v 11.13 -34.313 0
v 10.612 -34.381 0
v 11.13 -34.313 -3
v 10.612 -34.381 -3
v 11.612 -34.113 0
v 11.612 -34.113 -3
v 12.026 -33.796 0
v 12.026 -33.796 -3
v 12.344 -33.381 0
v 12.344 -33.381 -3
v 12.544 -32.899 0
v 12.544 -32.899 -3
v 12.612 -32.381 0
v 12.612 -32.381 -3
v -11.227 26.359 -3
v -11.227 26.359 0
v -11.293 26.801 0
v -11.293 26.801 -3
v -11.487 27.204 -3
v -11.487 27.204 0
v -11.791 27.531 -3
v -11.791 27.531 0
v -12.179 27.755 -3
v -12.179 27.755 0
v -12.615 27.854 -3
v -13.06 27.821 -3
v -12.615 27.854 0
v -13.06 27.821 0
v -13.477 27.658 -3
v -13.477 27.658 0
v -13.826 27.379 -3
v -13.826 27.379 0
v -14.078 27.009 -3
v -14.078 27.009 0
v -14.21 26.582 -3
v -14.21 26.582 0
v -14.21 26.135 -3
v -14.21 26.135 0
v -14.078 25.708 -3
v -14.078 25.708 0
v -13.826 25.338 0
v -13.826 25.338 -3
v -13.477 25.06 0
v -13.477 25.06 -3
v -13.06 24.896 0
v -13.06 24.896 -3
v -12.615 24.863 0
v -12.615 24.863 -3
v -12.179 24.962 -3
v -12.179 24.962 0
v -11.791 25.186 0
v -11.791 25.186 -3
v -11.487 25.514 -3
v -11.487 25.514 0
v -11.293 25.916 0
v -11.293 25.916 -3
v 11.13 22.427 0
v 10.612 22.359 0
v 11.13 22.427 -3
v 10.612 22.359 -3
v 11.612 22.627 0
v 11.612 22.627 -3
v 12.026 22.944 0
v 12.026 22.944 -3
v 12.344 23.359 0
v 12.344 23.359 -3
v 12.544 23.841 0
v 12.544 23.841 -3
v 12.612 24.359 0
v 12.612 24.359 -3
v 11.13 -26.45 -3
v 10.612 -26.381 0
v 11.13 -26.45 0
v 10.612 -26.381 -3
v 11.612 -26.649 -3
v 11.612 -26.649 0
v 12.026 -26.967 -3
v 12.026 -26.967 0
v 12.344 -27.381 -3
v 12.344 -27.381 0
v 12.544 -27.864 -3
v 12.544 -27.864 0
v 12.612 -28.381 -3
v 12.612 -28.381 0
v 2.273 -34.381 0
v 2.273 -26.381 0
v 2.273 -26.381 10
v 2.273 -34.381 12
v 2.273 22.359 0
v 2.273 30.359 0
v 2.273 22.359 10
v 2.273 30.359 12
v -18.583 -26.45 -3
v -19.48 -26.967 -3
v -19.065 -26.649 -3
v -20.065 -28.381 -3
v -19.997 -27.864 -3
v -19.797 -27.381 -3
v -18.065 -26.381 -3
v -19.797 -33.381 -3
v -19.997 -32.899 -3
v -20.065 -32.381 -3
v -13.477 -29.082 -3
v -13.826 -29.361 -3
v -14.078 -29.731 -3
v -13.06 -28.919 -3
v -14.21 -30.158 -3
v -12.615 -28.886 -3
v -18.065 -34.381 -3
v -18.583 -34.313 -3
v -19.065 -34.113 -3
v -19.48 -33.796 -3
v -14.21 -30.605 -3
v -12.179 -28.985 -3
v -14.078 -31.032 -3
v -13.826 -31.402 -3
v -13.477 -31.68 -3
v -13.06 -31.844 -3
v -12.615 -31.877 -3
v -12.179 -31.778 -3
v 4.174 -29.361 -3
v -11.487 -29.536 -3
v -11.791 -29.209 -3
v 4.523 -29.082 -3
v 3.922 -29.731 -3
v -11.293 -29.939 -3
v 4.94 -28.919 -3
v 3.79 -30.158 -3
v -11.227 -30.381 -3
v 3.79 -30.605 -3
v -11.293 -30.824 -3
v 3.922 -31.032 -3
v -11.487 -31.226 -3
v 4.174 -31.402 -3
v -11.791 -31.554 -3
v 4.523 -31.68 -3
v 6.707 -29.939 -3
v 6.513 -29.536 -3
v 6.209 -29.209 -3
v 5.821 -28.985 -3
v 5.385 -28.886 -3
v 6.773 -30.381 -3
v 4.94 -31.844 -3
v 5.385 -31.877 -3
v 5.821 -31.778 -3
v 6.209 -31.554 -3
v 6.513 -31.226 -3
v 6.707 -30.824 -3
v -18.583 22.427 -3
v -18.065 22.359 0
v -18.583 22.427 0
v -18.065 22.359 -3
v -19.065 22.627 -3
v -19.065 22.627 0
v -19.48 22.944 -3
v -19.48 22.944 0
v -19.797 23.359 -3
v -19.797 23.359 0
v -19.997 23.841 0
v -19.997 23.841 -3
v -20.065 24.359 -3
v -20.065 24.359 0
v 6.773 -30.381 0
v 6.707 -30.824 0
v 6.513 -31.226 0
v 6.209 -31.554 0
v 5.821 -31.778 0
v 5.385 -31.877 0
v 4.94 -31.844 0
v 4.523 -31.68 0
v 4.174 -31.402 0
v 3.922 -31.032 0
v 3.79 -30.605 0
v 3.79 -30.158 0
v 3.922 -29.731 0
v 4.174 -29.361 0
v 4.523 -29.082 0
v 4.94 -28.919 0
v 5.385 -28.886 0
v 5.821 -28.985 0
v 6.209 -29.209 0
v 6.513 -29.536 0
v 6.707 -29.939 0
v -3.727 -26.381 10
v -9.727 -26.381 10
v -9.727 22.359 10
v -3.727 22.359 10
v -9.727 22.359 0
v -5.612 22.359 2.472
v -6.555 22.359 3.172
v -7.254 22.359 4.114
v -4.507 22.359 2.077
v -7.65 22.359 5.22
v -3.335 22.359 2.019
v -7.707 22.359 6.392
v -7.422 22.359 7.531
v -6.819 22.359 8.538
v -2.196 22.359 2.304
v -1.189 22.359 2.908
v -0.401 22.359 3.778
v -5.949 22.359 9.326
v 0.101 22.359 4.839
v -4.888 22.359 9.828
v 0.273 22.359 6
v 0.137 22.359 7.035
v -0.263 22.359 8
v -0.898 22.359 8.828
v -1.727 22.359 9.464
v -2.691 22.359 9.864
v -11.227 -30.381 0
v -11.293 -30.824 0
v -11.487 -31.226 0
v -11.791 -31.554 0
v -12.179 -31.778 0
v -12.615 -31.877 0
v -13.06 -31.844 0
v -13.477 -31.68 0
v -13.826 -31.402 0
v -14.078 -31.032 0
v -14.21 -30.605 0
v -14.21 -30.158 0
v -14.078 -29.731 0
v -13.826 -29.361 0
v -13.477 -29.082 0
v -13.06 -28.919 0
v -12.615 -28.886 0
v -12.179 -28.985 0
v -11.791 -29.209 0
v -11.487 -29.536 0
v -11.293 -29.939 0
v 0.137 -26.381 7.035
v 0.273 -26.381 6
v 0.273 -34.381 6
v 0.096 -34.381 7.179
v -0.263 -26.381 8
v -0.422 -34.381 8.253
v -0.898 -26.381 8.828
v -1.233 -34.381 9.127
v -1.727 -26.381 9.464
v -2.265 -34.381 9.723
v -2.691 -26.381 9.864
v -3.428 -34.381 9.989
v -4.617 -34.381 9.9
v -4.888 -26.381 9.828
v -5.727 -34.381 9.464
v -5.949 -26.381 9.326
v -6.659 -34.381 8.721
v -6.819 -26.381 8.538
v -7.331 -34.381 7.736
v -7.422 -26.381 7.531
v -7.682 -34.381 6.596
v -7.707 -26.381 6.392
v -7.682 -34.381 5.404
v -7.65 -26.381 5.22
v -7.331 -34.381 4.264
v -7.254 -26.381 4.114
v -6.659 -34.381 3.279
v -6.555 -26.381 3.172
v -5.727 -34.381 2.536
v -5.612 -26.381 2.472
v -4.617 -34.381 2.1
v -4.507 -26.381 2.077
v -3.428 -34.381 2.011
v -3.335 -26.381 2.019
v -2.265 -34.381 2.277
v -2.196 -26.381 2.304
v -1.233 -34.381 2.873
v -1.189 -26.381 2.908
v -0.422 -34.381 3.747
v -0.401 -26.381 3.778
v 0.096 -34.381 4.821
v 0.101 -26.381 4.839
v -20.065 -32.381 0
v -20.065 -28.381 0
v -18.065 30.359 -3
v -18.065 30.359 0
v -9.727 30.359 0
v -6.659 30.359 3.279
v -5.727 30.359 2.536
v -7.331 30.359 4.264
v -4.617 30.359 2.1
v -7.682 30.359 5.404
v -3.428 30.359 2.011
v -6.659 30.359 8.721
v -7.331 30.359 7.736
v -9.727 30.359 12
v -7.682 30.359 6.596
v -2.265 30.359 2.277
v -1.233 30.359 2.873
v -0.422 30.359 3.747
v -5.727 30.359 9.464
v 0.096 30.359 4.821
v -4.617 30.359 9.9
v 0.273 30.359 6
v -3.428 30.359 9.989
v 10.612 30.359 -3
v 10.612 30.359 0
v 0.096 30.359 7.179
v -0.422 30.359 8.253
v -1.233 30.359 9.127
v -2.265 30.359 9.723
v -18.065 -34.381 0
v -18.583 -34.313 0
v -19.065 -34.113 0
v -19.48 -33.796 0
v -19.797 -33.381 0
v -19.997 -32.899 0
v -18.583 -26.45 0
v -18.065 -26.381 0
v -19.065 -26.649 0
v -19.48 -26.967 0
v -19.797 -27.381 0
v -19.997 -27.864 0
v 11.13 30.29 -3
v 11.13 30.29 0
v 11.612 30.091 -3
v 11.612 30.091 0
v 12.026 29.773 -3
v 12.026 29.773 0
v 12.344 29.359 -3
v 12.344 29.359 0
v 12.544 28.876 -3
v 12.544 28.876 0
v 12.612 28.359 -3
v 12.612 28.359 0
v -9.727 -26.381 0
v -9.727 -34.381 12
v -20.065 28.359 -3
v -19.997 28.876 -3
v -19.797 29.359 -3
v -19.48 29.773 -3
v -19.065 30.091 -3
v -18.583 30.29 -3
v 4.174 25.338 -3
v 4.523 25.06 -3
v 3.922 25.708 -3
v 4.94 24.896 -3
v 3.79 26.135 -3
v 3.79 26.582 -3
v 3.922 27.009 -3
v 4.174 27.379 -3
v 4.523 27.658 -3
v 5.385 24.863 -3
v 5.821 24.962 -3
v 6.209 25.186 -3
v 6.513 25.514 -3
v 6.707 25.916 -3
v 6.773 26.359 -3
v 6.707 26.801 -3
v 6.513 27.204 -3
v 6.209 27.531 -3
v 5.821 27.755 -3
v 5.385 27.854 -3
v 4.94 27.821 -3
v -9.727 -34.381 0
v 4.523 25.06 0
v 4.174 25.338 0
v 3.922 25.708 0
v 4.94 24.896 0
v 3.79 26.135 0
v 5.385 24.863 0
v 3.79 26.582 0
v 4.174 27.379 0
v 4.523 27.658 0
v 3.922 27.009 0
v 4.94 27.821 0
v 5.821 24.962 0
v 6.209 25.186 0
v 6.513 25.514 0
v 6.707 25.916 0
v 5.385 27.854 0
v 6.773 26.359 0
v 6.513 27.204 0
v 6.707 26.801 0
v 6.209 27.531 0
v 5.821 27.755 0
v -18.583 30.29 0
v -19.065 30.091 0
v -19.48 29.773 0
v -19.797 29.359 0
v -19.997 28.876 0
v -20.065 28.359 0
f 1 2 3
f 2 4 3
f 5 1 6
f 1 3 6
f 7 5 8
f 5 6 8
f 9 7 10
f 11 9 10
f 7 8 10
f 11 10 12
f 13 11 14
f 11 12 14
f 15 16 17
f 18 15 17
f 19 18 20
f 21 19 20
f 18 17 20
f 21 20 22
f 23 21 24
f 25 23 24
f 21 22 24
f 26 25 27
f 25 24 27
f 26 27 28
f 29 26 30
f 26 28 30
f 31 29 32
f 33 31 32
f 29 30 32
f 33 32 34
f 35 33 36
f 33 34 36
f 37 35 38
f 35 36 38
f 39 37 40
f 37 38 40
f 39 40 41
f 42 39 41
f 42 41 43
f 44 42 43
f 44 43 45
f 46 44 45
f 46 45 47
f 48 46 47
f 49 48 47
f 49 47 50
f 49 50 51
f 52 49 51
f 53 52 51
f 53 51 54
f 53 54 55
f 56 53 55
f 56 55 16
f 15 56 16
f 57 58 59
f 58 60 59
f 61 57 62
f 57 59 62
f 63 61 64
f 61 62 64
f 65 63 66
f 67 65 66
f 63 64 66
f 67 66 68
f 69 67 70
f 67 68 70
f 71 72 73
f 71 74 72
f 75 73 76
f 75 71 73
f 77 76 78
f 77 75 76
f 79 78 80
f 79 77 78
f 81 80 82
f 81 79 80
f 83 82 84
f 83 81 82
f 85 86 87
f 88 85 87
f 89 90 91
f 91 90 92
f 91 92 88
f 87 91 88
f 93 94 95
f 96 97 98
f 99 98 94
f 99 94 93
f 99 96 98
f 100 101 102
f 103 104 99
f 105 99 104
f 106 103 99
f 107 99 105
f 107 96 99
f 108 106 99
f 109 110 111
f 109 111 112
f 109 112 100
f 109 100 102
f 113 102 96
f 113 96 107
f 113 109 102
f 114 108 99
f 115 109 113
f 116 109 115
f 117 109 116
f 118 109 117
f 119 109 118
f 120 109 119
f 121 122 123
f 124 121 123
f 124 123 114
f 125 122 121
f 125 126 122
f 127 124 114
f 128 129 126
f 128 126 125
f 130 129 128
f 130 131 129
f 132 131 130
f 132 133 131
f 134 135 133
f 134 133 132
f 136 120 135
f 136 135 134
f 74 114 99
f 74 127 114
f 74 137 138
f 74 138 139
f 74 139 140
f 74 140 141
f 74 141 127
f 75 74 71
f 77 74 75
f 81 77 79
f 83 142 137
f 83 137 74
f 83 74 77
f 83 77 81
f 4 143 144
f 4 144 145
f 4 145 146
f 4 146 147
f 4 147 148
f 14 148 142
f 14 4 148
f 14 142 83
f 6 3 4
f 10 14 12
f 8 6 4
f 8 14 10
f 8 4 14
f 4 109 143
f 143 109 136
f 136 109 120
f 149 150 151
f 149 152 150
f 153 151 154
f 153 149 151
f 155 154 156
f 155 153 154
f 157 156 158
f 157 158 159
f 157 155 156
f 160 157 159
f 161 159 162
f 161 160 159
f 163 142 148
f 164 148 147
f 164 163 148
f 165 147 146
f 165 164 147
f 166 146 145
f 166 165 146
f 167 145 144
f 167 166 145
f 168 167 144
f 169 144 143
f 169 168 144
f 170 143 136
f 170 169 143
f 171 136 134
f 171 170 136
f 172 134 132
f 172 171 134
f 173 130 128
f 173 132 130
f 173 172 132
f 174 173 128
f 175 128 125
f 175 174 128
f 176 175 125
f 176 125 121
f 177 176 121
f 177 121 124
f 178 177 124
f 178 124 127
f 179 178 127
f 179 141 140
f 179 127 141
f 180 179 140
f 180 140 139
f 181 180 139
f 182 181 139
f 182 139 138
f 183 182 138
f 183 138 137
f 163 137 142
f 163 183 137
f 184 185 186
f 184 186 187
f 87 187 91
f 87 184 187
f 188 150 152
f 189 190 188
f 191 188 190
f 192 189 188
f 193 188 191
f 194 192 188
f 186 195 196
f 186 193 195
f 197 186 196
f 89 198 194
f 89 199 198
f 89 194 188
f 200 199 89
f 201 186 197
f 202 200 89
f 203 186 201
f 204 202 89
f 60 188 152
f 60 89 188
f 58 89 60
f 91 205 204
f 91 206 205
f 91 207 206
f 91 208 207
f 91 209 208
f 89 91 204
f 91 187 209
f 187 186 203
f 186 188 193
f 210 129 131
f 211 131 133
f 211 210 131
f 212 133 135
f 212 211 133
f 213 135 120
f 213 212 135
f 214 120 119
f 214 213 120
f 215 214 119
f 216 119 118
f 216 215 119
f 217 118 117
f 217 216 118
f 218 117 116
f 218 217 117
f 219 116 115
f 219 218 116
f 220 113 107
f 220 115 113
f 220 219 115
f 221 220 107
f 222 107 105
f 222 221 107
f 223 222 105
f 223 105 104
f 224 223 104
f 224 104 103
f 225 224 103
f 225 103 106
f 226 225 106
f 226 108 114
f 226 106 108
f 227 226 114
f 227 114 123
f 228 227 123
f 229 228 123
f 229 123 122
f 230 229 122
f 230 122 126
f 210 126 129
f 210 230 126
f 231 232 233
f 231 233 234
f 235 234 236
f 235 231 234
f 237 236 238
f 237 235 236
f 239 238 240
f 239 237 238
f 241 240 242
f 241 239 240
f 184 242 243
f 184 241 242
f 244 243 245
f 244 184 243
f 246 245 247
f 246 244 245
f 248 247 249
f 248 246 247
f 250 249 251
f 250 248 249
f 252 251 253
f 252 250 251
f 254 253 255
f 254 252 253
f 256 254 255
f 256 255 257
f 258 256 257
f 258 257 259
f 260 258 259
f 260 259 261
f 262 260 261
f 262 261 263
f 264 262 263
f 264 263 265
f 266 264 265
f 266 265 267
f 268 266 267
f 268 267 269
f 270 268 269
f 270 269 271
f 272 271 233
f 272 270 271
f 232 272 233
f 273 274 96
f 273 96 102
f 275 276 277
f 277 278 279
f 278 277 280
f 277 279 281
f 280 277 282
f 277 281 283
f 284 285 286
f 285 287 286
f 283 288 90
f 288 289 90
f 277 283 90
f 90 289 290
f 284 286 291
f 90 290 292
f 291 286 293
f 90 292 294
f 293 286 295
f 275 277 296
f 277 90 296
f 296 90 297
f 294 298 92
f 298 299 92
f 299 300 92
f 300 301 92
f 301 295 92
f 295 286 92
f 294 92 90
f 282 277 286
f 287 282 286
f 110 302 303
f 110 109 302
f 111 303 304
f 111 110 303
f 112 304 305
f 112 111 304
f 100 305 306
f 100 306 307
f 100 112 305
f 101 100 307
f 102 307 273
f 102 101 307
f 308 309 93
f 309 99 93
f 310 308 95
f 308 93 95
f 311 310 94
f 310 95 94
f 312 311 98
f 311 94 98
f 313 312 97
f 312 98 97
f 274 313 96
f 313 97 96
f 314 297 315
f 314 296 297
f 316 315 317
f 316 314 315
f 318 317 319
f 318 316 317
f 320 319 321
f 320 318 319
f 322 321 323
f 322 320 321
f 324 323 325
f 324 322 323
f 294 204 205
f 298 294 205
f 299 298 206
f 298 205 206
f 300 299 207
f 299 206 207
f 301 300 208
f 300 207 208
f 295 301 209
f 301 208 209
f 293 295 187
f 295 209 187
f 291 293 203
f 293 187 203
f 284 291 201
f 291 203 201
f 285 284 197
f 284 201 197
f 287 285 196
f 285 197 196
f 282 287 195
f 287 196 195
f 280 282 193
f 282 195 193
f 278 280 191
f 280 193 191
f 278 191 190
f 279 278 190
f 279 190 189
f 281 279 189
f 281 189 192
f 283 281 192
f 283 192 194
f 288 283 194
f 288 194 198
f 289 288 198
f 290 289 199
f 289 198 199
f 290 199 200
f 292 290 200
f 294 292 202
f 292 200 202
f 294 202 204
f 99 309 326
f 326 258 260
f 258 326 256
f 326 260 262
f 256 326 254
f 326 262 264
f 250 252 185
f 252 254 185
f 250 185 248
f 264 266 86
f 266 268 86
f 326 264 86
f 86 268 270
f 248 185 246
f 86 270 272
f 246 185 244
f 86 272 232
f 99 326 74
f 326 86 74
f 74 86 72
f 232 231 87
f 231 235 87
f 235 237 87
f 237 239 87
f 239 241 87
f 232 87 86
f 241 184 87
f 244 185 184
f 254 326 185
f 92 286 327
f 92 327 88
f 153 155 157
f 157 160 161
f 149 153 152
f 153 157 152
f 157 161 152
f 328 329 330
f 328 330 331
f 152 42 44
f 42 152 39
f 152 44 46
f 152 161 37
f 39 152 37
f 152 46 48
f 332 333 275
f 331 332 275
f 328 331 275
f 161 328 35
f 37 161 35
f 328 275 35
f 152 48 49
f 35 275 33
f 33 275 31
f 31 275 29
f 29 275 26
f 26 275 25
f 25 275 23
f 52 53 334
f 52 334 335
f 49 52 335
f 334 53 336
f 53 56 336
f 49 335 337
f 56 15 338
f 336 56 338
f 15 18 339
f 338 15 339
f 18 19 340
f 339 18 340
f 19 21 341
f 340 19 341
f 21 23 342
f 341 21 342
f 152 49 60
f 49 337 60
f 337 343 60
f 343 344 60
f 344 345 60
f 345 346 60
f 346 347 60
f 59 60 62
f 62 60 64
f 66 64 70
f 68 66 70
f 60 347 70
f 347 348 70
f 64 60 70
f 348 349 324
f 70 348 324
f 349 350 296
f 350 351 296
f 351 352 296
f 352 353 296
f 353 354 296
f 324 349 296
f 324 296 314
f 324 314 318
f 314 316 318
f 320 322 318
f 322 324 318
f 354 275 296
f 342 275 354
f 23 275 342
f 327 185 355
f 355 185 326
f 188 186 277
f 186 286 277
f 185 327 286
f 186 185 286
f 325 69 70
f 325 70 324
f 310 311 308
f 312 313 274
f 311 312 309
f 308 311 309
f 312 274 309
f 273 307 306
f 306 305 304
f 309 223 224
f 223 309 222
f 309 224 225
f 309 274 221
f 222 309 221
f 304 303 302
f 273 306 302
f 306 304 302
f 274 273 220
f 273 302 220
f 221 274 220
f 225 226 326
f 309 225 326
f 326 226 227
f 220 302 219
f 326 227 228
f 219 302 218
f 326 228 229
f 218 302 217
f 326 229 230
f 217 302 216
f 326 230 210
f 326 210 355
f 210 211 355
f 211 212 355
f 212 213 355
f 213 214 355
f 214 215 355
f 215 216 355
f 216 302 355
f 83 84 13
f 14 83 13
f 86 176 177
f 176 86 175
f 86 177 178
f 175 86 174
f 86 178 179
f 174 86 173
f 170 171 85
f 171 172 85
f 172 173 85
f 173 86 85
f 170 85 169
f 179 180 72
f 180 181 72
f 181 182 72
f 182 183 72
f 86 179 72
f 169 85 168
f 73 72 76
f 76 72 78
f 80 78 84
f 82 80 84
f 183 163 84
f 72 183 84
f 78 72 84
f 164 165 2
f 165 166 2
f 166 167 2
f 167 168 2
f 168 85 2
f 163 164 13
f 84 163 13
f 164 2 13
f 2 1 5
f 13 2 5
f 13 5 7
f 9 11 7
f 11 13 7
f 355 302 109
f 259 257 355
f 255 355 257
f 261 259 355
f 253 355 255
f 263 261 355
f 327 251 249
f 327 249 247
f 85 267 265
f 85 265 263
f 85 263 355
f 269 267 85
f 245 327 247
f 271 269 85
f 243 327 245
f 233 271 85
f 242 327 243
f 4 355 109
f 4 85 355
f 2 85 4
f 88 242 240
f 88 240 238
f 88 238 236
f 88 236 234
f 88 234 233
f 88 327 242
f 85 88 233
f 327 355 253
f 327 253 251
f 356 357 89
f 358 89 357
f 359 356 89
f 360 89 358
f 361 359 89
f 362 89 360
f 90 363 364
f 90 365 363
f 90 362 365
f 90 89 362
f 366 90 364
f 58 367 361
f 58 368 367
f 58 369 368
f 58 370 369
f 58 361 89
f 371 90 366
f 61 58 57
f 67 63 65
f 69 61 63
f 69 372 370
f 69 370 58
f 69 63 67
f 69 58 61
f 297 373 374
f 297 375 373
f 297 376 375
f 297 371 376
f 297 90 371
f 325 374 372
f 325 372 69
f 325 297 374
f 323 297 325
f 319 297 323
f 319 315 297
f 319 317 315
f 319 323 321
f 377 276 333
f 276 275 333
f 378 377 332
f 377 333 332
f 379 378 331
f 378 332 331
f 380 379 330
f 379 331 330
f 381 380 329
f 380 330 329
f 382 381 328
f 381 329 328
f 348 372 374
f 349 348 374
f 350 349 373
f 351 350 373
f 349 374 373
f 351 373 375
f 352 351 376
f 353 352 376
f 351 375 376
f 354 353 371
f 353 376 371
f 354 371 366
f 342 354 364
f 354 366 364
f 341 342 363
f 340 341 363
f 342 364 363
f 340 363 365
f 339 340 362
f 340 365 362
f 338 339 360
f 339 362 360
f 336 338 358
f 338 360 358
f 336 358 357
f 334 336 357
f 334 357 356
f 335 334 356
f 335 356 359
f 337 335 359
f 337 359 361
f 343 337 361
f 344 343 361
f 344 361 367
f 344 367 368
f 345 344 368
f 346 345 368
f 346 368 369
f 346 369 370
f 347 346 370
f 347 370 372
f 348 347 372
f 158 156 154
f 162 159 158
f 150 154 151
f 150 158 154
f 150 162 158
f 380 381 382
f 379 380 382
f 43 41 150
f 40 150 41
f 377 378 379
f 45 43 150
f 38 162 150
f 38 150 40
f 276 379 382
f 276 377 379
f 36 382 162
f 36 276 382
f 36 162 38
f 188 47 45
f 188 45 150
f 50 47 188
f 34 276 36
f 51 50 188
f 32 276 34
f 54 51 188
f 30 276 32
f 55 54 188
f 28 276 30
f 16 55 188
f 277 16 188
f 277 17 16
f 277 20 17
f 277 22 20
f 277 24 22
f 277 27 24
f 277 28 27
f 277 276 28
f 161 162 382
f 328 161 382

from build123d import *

# Parameters (mm, degrees)
SKETCH_1_W             = 32.677388302
SKETCH_1_H             = 8
EXTRUDE_1_DEPTH        = 3
SKETCH_2_R             = 1.5
CUT_EXTRUDE_1_DEPTH    = 4
SKETCH_3_R             = 6
EXTRUDE_2_DEPTH        = 8
EXTRUDE_3_DEPTH        = 8
SKETCH_10_W            = 12
SKETCH_10_H            = 24.37
EXTRUDE_5_DEPTH        = 2
SKETCH_4_R             = 4
CUT_EXTRUDE_2_DEPTH    = 9
FILLET_1_R             = 2
MIRROR_3_COPY_1_DEPTH  = 8
FILLET_1_OF_MIRROR_3_R = 2


with BuildPart() as part:
    # 草图1 → 凸台-拉伸1 (new body)
    with BuildSketch(Plane.XY):
        with Locations((-3.726697353, 26.358574689)):
            Rectangle(SKETCH_1_W, SKETCH_1_H)
    extrude_1 = extrude(amount=-EXTRUDE_1_DEPTH)

    # 草图2 → 切除-拉伸1 (cut, through all)
    with BuildSketch(Plane.XY):
        with Locations((-12.726697353, 26.358574689)):
            Circle(SKETCH_2_R)
        with Locations((5.273302647, 26.358574689)):
            Circle(SKETCH_2_R)
    cut_extrude_1 = extrude(amount=-CUT_EXTRUDE_1_DEPTH, mode=Mode.SUBTRACT)



with BuildPart() as body_2:
    # 草图3 → 凸台-拉伸2 (new body)
    with BuildSketch(Plane.XZ.offset(-22.358574689)):
        with Locations((-3.726697353, 6)):
            Circle(SKETCH_3_R)
    extrude_2 = extrude(amount=-EXTRUDE_2_DEPTH)


with BuildPart() as part_1:
    add(part.part)

    add(body_2.part)  # 凸台-拉伸3 merges body 2
    # 草图5 → 凸台-拉伸3 (add)
    with BuildSketch(Plane.XZ.offset(-22.358574689)):
        Polygon((-3.726697353, 0), (-9.726697353, 6), (-9.726697353, 0), align=None)
        Polygon((2.273302647, 6), (-3.726697353, 0), (2.273302647, 0), align=None)
    extrude_3 = extrude(amount=-EXTRUDE_3_DEPTH)

    # 镜向1: 凸台-拉伸3 across plane
    add(extrude_3.mirror(Plane(origin=(0, 0, 6), x_dir=(1, 0, 0), z_dir=(0, 0, -1))))

    # 草图10 → 凸台-拉伸5 (add)
    with BuildSketch(Plane.XY.offset(12)):
        with Locations((-3.726697353, 10.173574689)):
            Rectangle(SKETCH_10_W, SKETCH_10_H)
    extrude_5 = extrude(amount=-EXTRUDE_5_DEPTH)

    # 草图4 → 切除-拉伸2 (cut, through all)
    with BuildSketch(Plane.XZ.offset(-22.358574689)):
        with Locations((-3.726697353, 6)):
            Circle(SKETCH_4_R)
    cut_extrude_2 = extrude(amount=-CUT_EXTRUDE_2_DEPTH, mode=Mode.SUBTRACT)

    # 圆角1
    fillet_1_edges = [part_1.edges().sort_by_distance(p)[0] for p in [
        (12.611996798, 22.358574689, -1.5),
        (-20.065391504, 22.358574689, -1.5),
        (-20.065391504, 30.358574689, -1.5),
        (12.611996798, 30.358574689, -1.5),
    ]]
    fillet(fillet_1_edges, radius=FILLET_1_R)

    # 镜向3: 凸台-拉伸1, 切除-拉伸1, 凸台-拉伸2, 切除-拉伸2, 凸台-拉伸3, 凸台-拉伸5 across plane
    add(extrude_1.mirror(Plane(origin=(-9.726697353, -2.011425311, 10), x_dir=(0, 0, 1), z_dir=(0, -1, 0))))
    add(cut_extrude_1.mirror(Plane(origin=(-9.726697353, -2.011425311, 10), x_dir=(0, 0, 1), z_dir=(0, -1, 0))), mode=Mode.SUBTRACT)
    add(extrude_2.mirror(Plane(origin=(-9.726697353, -2.011425311, 10), x_dir=(0, 0, 1), z_dir=(0, -1, 0))))
    add(cut_extrude_2.mirror(Plane(origin=(-9.726697353, -2.011425311, 10), x_dir=(0, 0, 1), z_dir=(0, -1, 0))), mode=Mode.SUBTRACT)
    add(extrude_3.mirror(Plane(origin=(-9.726697353, -2.011425311, 10), x_dir=(0, 0, 1), z_dir=(0, -1, 0))))
    add(extrude_5.mirror(Plane(origin=(-9.726697353, -2.011425311, 10), x_dir=(0, 0, 1), z_dir=(0, -1, 0))))

    # 镜向3 copy 1 sketch → 镜向3 copy 1 (add)
    with BuildSketch(Plane(origin=(0, -26.381425311, 12), x_dir=(1, 0, 0), z_dir=(0, 1, 0))):
        Polygon((-3.726697353, 0), (-9.726697353, 6), (-9.726697353, 0), align=None)
        Polygon((2.273302647, 6), (-3.726697353, 0), (2.273302647, 0), align=None)
    extrude(amount=-MIRROR_3_COPY_1_DEPTH)

    # 圆角1 of 镜向3
    fillet_1_of_mirror_3_edges = [part_1.edges().sort_by_distance(p)[0] for p in [
        (12.611996798, -26.381425311, -1.5),
        (-20.065391504, -26.381425311, -1.5),
        (-20.065391504, -34.381425311, -1.5),
        (12.611996798, -34.381425311, -1.5),
    ]]
    fillet(fillet_1_of_mirror_3_edges, radius=FILLET_1_OF_MIRROR_3_R)


solid = part_1.part
